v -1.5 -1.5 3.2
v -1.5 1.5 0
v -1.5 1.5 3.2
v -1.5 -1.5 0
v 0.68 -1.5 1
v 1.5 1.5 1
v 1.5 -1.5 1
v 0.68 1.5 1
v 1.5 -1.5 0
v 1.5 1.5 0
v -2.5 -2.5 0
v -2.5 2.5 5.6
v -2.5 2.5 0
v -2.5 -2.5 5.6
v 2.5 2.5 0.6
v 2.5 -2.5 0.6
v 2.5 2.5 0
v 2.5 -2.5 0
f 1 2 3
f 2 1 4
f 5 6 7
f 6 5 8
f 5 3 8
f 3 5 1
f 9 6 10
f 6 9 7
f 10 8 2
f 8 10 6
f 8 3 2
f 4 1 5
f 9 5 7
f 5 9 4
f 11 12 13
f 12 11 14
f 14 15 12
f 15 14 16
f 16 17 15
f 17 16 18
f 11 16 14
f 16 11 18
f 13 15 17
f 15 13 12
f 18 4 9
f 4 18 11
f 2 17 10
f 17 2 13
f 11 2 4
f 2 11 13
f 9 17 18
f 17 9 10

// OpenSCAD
// file: ../p/rect3.scad
use <../lib.scad>
function ldraw_lib__rect3() = [
// 0 Rectangle with 3 Edges
// 0 Name: rect3.dat
// 0 Author: Mark Kennedy [mkennedy]
// 0 !LDRAW_ORG Primitive UPDATE 2010-01
// 0 !LICENSE Licensed under CC BY 4.0 : see CAreadme.txt
// 
// 0 BFC CERTIFY CCW
  [0,"BFC","CERTIFY"],
  [0,"BFC","CCW"],
// 
// 0 !HISTORY 2003-08-01 [PTadmin] Official Update 2003-02
// 0 !HISTORY 2007-06-24 [PTadmin] Header formatted for Contributor Agreement
// 0 !HISTORY 2008-07-01 [PTadmin] Official Update 2008-01
// 0 !HISTORY 2010-01-17 [mikeheide] Change winding to CCW
// 0 !HISTORY 2010-04-05 [PTadmin] Official Update 2010-01
// 
// 
// 2 24 1 0 1 -1 0 1
  [2,24,1,0,1,-1,0,1],
// 2 24 1 0 1 1 0 -1
  [2,24,1,0,1,1,0,-1],
// 2 24 -1 0 1 -1 0 -1
  [2,24,-1,0,1,-1,0,-1],
// 4 16 -1 0 1 -1 0 -1 1 0 -1 1 0 1
  [4,16,-1,0,1,-1,0,-1,1,0,-1,1,0,1],
// 0 //
];
module ldraw_lib__rect3(step=0, col=false, unit=2/5, alt=false, line=0.2, solid=!$preview)
    makepoly(ldraw_lib__rect3(), step=step, col=col, unit=unit, alt=alt, line=line, solid=solid);
ldraw_lib__rect3(line=0.2);
// file: ../p/rect2p.scad
use <../lib.scad>
function ldraw_lib__rect2p() = [
// 0 Rectangle with 2 Parallel Edges
// 0 Name: rect2p.dat
// 0 Author: Donald Sutter [technog]
// 0 !LDRAW_ORG Primitive UPDATE 2010-01
// 0 !LICENSE Licensed under CC BY 4.0 : see CAreadme.txt
// 
// 0 BFC CERTIFY CCW
  [0,"BFC","CERTIFY"],
  [0,"BFC","CCW"],
// 
// 0 !HISTORY 2003-08-01 [PTadmin] Official Update 2003-02
// 0 !HISTORY 2007-06-24 [PTadmin] Header formatted for Contributor Agreement
// 0 !HISTORY 2008-07-01 [PTadmin] Official Update 2008-01
// 0 !HISTORY 2010-01-17 [mikeheide] changed winding to CCW
// 0 !HISTORY 2010-04-05 [PTadmin] Official Update 2010-01
// 
// 
// 2 24 1 0 1 -1 0 1
  [2,24,1,0,1,-1,0,1],
// 2 24 -1 0 -1 1 0 -1
  [2,24,-1,0,-1,1,0,-1],
// 4 16 -1 0 1 -1 0 -1 1 0 -1 1 0 1
  [4,16,-1,0,1,-1,0,-1,1,0,-1,1,0,1],
// 0
];
module ldraw_lib__rect2p(step=0, col=false, unit=2/5, alt=false, line=0.2, solid=!$preview)
    makepoly(ldraw_lib__rect2p(), step=step, col=col, unit=unit, alt=alt, line=line, solid=solid);
ldraw_lib__rect2p(line=0.2);
// file: ../p/rect.scad
use <../lib.scad>
function ldraw_lib__rect() = [
// 0 Rectangle
// 0 Name: rect.dat
// 0 Author: James Jessiman
// 0 !LDRAW_ORG Primitive UPDATE 2010-01
// 0 !LICENSE Licensed under CC BY 4.0 : see CAreadme.txt
// 
// 0 BFC CERTIFY CCW
  [0,"BFC","CERTIFY"],
  [0,"BFC","CCW"],
// 
// 0 !HISTORY 2002-04-05 [hafhead] Added BFC statement
// 0 !HISTORY 2002-04-25 [PTadmin] Official Update 2002-02
// 0 !HISTORY 2007-06-24 [PTadmin] Header formatted for Contributor Agreement
// 0 !HISTORY 2008-07-01 [PTadmin] Official Update 2008-01
// 0 !HISTORY 2010-01-17 [mikeheide] changed winding to CCW
// 0 !HISTORY 2010-04-05 [PTadmin] Official Update 2010-01
// 
// 
// 2 24 1 0 1 -1 0 1
  [2,24,1,0,1,-1,0,1],
// 2 24 -1 0 1 -1 0 -1
  [2,24,-1,0,1,-1,0,-1],
// 2 24 -1 0 -1 1 0 -1
  [2,24,-1,0,-1,1,0,-1],
// 2 24 1 0 -1 1 0 1
  [2,24,1,0,-1,1,0,1],
// 4 16 -1 0 1 -1 0 -1 1 0 -1 1 0 1
  [4,16,-1,0,1,-1,0,-1,1,0,-1,1,0,1],
// 0
];
module ldraw_lib__rect(step=0, col=false, unit=2/5, alt=false, line=0.2, solid=!$preview)
    makepoly(ldraw_lib__rect(), step=step, col=col, unit=unit, alt=alt, line=line, solid=solid);
ldraw_lib__rect(line=0.2);
// main file
use <../lib.scad>
use <../p/rect.scad>
use <../p/rect2p.scad>
use <../p/rect3.scad>
function ldraw_lib__u7030() = [
// 0 Modulex Slope Brick 45  1 x  1
// 0 Name: u7030.dat
// 0 Author: Magnus Forsberg [MagFors]
// 0 !LDRAW_ORG Part UPDATE 2025-09
// 0 !LICENSE Licensed under CC BY 4.0 : see CAreadme.txt
// 
// 0 BFC CERTIFY CCW
  [0,"BFC","CERTIFY"],
  [0,"BFC","CCW"],
// 
// 0 !KEYWORDS 45 degrees, Bricklink Mx1511, Peeron x715, Rebrickable 1511
// 0 !KEYWORDS slope 1:1
// 
// 0 !HISTORY 2024-02-04 [MagFors] Original design by Tore Eriksson slp0101d
// 0 !HISTORY 2025-09-29 [OrionP] Official Update 2025-09
// 
// 1 16 -3.75 -4 0 0 -1 0 0 0 -4 3.75 0 0 rect.dat
  [1,16,-3.75,-4,0,0,-1,0,0,0,-4,3.75,0,0, ldraw_lib__rect()],
// 2 24 3.75 -2.5 -3.75 3.75 -2.5 3.75
  [2,24,3.75,-2.5,-3.75,3.75,-2.5,3.75],
// 1 16 2.725 -2.5 0 0 0 -1.025 0 -1 0 -3.75 0 0 rect3.dat
  [1,16,2.725,-2.5,0,0,0,-1.025,0,-1,0,-3.75,0,0, ldraw_lib__rect3()],
// 1 16 -1.025 -5.25 0 -2.725 0 0 -2.75 -1 0 0 0 3.75 rect2p.dat
  [1,16,-1.025,-5.25,0,-2.725,0,0,-2.75,-1,0,0,0,3.75, ldraw_lib__rect2p()],
// 2 24 -3.75 0 -3.75 3.75 0 -3.75
  [2,24,-3.75,0,-3.75,3.75,0,-3.75],
// 2 24 -3.75 0 3.75 3.75 0 3.75
  [2,24,-3.75,0,3.75,3.75,0,3.75],
// 1 16 3.75 -1.25 0 0 1 0 -1.25 0 0 0 0 3.75 rect.dat
  [1,16,3.75,-1.25,0,0,1,0,-1.25,0,0,0,0,3.75, ldraw_lib__rect()],
// 4 16 3.75 -2.5 3.75 1.7 -2.5 3.75 -3.75 0 3.75 3.75 0 3.75
  [4,16,3.75,-2.5,3.75,1.7,-2.5,3.75,-3.75,0,3.75,3.75,0,3.75],
// 3 16 1.7 -2.5 3.75 -3.75 -8 3.75 -3.75 0 3.75
  [3,16,1.7,-2.5,3.75,-3.75,-8,3.75,-3.75,0,3.75],
// 3 16 -3.75 0 -3.75 -3.75 -8 -3.75 1.7 -2.5 -3.75
  [3,16,-3.75,0,-3.75,-3.75,-8,-3.75,1.7,-2.5,-3.75],
// 4 16 -3.75 0 -3.75 1.7 -2.5 -3.75 3.75 -2.5 -3.75 3.75 0 -3.75
  [4,16,-3.75,0,-3.75,1.7,-2.5,-3.75,3.75,-2.5,-3.75,3.75,0,-3.75],
// 1 16 -6.25 -7 0 0 1 0 0 0 -7 -6.25 0 0 rect.dat
  [1,16,-6.25,-7,0,0,1,0,0,0,-7,-6.25,0,0, ldraw_lib__rect()],
// 1 16 0 -7.75 0 6.25 0 0 6.25 1 0 0 0 6.25 rect2p.dat
  [1,16,0,-7.75,0,6.25,0,0,6.25,1,0,0,0,6.25, ldraw_lib__rect2p()],
// 1 16 6.25 -.75 0 0 -1 0 -.75 0 0 0 0 -6.25 rect.dat
  [1,16,6.25,-.75,0,0,-1,0,-.75,0,0,0,0,-6.25, ldraw_lib__rect()],
// 2 24 -6.25 0 -6.25 6.25 0 -6.25
  [2,24,-6.25,0,-6.25,6.25,0,-6.25],
// 2 24 -6.25 0 6.25 6.25 0 6.25
  [2,24,-6.25,0,6.25,6.25,0,6.25],
// 4 16 -6.25 0 -6.25 6.25 0 -6.25 6.25 -1.5 -6.25 -6.25 -14 -6.25
  [4,16,-6.25,0,-6.25,6.25,0,-6.25,6.25,-1.5,-6.25,-6.25,-14,-6.25],
// 4 16 6.25 0 6.25 -6.25 0 6.25 -6.25 -14 6.25 6.25 -1.5 6.25
  [4,16,6.25,0,6.25,-6.25,0,6.25,-6.25,-14,6.25,6.25,-1.5,6.25],
// 4 16 -6.25 0 -6.25 -3.75 0 -3.75 3.75 0 -3.75 6.25 0 -6.25
  [4,16,-6.25,0,-6.25,-3.75,0,-3.75,3.75,0,-3.75,6.25,0,-6.25],
// 4 16 -6.25 0 6.25 6.25 0 6.25 3.75 0 3.75 -3.75 0 3.75
  [4,16,-6.25,0,6.25,6.25,0,6.25,3.75,0,3.75,-3.75,0,3.75],
// 4 16 -6.25 0 -6.25 -6.25 0 6.25 -3.75 0 3.75 -3.75 0 -3.75
  [4,16,-6.25,0,-6.25,-6.25,0,6.25,-3.75,0,3.75,-3.75,0,-3.75],
// 4 16 6.25 0 -6.25 3.75 0 -3.75 3.75 0 3.75 6.25 0 6.25
  [4,16,6.25,0,-6.25,3.75,0,-3.75,3.75,0,3.75,6.25,0,6.25],
];
module ldraw_lib__u7030(step=0, col=false, unit=2/5, alt=false, line=0.2, solid=!$preview)
    makepoly(ldraw_lib__u7030(), step=step, col=col, unit=unit, alt=alt, line=line, solid=solid);
ldraw_lib__u7030(line=0.2);
